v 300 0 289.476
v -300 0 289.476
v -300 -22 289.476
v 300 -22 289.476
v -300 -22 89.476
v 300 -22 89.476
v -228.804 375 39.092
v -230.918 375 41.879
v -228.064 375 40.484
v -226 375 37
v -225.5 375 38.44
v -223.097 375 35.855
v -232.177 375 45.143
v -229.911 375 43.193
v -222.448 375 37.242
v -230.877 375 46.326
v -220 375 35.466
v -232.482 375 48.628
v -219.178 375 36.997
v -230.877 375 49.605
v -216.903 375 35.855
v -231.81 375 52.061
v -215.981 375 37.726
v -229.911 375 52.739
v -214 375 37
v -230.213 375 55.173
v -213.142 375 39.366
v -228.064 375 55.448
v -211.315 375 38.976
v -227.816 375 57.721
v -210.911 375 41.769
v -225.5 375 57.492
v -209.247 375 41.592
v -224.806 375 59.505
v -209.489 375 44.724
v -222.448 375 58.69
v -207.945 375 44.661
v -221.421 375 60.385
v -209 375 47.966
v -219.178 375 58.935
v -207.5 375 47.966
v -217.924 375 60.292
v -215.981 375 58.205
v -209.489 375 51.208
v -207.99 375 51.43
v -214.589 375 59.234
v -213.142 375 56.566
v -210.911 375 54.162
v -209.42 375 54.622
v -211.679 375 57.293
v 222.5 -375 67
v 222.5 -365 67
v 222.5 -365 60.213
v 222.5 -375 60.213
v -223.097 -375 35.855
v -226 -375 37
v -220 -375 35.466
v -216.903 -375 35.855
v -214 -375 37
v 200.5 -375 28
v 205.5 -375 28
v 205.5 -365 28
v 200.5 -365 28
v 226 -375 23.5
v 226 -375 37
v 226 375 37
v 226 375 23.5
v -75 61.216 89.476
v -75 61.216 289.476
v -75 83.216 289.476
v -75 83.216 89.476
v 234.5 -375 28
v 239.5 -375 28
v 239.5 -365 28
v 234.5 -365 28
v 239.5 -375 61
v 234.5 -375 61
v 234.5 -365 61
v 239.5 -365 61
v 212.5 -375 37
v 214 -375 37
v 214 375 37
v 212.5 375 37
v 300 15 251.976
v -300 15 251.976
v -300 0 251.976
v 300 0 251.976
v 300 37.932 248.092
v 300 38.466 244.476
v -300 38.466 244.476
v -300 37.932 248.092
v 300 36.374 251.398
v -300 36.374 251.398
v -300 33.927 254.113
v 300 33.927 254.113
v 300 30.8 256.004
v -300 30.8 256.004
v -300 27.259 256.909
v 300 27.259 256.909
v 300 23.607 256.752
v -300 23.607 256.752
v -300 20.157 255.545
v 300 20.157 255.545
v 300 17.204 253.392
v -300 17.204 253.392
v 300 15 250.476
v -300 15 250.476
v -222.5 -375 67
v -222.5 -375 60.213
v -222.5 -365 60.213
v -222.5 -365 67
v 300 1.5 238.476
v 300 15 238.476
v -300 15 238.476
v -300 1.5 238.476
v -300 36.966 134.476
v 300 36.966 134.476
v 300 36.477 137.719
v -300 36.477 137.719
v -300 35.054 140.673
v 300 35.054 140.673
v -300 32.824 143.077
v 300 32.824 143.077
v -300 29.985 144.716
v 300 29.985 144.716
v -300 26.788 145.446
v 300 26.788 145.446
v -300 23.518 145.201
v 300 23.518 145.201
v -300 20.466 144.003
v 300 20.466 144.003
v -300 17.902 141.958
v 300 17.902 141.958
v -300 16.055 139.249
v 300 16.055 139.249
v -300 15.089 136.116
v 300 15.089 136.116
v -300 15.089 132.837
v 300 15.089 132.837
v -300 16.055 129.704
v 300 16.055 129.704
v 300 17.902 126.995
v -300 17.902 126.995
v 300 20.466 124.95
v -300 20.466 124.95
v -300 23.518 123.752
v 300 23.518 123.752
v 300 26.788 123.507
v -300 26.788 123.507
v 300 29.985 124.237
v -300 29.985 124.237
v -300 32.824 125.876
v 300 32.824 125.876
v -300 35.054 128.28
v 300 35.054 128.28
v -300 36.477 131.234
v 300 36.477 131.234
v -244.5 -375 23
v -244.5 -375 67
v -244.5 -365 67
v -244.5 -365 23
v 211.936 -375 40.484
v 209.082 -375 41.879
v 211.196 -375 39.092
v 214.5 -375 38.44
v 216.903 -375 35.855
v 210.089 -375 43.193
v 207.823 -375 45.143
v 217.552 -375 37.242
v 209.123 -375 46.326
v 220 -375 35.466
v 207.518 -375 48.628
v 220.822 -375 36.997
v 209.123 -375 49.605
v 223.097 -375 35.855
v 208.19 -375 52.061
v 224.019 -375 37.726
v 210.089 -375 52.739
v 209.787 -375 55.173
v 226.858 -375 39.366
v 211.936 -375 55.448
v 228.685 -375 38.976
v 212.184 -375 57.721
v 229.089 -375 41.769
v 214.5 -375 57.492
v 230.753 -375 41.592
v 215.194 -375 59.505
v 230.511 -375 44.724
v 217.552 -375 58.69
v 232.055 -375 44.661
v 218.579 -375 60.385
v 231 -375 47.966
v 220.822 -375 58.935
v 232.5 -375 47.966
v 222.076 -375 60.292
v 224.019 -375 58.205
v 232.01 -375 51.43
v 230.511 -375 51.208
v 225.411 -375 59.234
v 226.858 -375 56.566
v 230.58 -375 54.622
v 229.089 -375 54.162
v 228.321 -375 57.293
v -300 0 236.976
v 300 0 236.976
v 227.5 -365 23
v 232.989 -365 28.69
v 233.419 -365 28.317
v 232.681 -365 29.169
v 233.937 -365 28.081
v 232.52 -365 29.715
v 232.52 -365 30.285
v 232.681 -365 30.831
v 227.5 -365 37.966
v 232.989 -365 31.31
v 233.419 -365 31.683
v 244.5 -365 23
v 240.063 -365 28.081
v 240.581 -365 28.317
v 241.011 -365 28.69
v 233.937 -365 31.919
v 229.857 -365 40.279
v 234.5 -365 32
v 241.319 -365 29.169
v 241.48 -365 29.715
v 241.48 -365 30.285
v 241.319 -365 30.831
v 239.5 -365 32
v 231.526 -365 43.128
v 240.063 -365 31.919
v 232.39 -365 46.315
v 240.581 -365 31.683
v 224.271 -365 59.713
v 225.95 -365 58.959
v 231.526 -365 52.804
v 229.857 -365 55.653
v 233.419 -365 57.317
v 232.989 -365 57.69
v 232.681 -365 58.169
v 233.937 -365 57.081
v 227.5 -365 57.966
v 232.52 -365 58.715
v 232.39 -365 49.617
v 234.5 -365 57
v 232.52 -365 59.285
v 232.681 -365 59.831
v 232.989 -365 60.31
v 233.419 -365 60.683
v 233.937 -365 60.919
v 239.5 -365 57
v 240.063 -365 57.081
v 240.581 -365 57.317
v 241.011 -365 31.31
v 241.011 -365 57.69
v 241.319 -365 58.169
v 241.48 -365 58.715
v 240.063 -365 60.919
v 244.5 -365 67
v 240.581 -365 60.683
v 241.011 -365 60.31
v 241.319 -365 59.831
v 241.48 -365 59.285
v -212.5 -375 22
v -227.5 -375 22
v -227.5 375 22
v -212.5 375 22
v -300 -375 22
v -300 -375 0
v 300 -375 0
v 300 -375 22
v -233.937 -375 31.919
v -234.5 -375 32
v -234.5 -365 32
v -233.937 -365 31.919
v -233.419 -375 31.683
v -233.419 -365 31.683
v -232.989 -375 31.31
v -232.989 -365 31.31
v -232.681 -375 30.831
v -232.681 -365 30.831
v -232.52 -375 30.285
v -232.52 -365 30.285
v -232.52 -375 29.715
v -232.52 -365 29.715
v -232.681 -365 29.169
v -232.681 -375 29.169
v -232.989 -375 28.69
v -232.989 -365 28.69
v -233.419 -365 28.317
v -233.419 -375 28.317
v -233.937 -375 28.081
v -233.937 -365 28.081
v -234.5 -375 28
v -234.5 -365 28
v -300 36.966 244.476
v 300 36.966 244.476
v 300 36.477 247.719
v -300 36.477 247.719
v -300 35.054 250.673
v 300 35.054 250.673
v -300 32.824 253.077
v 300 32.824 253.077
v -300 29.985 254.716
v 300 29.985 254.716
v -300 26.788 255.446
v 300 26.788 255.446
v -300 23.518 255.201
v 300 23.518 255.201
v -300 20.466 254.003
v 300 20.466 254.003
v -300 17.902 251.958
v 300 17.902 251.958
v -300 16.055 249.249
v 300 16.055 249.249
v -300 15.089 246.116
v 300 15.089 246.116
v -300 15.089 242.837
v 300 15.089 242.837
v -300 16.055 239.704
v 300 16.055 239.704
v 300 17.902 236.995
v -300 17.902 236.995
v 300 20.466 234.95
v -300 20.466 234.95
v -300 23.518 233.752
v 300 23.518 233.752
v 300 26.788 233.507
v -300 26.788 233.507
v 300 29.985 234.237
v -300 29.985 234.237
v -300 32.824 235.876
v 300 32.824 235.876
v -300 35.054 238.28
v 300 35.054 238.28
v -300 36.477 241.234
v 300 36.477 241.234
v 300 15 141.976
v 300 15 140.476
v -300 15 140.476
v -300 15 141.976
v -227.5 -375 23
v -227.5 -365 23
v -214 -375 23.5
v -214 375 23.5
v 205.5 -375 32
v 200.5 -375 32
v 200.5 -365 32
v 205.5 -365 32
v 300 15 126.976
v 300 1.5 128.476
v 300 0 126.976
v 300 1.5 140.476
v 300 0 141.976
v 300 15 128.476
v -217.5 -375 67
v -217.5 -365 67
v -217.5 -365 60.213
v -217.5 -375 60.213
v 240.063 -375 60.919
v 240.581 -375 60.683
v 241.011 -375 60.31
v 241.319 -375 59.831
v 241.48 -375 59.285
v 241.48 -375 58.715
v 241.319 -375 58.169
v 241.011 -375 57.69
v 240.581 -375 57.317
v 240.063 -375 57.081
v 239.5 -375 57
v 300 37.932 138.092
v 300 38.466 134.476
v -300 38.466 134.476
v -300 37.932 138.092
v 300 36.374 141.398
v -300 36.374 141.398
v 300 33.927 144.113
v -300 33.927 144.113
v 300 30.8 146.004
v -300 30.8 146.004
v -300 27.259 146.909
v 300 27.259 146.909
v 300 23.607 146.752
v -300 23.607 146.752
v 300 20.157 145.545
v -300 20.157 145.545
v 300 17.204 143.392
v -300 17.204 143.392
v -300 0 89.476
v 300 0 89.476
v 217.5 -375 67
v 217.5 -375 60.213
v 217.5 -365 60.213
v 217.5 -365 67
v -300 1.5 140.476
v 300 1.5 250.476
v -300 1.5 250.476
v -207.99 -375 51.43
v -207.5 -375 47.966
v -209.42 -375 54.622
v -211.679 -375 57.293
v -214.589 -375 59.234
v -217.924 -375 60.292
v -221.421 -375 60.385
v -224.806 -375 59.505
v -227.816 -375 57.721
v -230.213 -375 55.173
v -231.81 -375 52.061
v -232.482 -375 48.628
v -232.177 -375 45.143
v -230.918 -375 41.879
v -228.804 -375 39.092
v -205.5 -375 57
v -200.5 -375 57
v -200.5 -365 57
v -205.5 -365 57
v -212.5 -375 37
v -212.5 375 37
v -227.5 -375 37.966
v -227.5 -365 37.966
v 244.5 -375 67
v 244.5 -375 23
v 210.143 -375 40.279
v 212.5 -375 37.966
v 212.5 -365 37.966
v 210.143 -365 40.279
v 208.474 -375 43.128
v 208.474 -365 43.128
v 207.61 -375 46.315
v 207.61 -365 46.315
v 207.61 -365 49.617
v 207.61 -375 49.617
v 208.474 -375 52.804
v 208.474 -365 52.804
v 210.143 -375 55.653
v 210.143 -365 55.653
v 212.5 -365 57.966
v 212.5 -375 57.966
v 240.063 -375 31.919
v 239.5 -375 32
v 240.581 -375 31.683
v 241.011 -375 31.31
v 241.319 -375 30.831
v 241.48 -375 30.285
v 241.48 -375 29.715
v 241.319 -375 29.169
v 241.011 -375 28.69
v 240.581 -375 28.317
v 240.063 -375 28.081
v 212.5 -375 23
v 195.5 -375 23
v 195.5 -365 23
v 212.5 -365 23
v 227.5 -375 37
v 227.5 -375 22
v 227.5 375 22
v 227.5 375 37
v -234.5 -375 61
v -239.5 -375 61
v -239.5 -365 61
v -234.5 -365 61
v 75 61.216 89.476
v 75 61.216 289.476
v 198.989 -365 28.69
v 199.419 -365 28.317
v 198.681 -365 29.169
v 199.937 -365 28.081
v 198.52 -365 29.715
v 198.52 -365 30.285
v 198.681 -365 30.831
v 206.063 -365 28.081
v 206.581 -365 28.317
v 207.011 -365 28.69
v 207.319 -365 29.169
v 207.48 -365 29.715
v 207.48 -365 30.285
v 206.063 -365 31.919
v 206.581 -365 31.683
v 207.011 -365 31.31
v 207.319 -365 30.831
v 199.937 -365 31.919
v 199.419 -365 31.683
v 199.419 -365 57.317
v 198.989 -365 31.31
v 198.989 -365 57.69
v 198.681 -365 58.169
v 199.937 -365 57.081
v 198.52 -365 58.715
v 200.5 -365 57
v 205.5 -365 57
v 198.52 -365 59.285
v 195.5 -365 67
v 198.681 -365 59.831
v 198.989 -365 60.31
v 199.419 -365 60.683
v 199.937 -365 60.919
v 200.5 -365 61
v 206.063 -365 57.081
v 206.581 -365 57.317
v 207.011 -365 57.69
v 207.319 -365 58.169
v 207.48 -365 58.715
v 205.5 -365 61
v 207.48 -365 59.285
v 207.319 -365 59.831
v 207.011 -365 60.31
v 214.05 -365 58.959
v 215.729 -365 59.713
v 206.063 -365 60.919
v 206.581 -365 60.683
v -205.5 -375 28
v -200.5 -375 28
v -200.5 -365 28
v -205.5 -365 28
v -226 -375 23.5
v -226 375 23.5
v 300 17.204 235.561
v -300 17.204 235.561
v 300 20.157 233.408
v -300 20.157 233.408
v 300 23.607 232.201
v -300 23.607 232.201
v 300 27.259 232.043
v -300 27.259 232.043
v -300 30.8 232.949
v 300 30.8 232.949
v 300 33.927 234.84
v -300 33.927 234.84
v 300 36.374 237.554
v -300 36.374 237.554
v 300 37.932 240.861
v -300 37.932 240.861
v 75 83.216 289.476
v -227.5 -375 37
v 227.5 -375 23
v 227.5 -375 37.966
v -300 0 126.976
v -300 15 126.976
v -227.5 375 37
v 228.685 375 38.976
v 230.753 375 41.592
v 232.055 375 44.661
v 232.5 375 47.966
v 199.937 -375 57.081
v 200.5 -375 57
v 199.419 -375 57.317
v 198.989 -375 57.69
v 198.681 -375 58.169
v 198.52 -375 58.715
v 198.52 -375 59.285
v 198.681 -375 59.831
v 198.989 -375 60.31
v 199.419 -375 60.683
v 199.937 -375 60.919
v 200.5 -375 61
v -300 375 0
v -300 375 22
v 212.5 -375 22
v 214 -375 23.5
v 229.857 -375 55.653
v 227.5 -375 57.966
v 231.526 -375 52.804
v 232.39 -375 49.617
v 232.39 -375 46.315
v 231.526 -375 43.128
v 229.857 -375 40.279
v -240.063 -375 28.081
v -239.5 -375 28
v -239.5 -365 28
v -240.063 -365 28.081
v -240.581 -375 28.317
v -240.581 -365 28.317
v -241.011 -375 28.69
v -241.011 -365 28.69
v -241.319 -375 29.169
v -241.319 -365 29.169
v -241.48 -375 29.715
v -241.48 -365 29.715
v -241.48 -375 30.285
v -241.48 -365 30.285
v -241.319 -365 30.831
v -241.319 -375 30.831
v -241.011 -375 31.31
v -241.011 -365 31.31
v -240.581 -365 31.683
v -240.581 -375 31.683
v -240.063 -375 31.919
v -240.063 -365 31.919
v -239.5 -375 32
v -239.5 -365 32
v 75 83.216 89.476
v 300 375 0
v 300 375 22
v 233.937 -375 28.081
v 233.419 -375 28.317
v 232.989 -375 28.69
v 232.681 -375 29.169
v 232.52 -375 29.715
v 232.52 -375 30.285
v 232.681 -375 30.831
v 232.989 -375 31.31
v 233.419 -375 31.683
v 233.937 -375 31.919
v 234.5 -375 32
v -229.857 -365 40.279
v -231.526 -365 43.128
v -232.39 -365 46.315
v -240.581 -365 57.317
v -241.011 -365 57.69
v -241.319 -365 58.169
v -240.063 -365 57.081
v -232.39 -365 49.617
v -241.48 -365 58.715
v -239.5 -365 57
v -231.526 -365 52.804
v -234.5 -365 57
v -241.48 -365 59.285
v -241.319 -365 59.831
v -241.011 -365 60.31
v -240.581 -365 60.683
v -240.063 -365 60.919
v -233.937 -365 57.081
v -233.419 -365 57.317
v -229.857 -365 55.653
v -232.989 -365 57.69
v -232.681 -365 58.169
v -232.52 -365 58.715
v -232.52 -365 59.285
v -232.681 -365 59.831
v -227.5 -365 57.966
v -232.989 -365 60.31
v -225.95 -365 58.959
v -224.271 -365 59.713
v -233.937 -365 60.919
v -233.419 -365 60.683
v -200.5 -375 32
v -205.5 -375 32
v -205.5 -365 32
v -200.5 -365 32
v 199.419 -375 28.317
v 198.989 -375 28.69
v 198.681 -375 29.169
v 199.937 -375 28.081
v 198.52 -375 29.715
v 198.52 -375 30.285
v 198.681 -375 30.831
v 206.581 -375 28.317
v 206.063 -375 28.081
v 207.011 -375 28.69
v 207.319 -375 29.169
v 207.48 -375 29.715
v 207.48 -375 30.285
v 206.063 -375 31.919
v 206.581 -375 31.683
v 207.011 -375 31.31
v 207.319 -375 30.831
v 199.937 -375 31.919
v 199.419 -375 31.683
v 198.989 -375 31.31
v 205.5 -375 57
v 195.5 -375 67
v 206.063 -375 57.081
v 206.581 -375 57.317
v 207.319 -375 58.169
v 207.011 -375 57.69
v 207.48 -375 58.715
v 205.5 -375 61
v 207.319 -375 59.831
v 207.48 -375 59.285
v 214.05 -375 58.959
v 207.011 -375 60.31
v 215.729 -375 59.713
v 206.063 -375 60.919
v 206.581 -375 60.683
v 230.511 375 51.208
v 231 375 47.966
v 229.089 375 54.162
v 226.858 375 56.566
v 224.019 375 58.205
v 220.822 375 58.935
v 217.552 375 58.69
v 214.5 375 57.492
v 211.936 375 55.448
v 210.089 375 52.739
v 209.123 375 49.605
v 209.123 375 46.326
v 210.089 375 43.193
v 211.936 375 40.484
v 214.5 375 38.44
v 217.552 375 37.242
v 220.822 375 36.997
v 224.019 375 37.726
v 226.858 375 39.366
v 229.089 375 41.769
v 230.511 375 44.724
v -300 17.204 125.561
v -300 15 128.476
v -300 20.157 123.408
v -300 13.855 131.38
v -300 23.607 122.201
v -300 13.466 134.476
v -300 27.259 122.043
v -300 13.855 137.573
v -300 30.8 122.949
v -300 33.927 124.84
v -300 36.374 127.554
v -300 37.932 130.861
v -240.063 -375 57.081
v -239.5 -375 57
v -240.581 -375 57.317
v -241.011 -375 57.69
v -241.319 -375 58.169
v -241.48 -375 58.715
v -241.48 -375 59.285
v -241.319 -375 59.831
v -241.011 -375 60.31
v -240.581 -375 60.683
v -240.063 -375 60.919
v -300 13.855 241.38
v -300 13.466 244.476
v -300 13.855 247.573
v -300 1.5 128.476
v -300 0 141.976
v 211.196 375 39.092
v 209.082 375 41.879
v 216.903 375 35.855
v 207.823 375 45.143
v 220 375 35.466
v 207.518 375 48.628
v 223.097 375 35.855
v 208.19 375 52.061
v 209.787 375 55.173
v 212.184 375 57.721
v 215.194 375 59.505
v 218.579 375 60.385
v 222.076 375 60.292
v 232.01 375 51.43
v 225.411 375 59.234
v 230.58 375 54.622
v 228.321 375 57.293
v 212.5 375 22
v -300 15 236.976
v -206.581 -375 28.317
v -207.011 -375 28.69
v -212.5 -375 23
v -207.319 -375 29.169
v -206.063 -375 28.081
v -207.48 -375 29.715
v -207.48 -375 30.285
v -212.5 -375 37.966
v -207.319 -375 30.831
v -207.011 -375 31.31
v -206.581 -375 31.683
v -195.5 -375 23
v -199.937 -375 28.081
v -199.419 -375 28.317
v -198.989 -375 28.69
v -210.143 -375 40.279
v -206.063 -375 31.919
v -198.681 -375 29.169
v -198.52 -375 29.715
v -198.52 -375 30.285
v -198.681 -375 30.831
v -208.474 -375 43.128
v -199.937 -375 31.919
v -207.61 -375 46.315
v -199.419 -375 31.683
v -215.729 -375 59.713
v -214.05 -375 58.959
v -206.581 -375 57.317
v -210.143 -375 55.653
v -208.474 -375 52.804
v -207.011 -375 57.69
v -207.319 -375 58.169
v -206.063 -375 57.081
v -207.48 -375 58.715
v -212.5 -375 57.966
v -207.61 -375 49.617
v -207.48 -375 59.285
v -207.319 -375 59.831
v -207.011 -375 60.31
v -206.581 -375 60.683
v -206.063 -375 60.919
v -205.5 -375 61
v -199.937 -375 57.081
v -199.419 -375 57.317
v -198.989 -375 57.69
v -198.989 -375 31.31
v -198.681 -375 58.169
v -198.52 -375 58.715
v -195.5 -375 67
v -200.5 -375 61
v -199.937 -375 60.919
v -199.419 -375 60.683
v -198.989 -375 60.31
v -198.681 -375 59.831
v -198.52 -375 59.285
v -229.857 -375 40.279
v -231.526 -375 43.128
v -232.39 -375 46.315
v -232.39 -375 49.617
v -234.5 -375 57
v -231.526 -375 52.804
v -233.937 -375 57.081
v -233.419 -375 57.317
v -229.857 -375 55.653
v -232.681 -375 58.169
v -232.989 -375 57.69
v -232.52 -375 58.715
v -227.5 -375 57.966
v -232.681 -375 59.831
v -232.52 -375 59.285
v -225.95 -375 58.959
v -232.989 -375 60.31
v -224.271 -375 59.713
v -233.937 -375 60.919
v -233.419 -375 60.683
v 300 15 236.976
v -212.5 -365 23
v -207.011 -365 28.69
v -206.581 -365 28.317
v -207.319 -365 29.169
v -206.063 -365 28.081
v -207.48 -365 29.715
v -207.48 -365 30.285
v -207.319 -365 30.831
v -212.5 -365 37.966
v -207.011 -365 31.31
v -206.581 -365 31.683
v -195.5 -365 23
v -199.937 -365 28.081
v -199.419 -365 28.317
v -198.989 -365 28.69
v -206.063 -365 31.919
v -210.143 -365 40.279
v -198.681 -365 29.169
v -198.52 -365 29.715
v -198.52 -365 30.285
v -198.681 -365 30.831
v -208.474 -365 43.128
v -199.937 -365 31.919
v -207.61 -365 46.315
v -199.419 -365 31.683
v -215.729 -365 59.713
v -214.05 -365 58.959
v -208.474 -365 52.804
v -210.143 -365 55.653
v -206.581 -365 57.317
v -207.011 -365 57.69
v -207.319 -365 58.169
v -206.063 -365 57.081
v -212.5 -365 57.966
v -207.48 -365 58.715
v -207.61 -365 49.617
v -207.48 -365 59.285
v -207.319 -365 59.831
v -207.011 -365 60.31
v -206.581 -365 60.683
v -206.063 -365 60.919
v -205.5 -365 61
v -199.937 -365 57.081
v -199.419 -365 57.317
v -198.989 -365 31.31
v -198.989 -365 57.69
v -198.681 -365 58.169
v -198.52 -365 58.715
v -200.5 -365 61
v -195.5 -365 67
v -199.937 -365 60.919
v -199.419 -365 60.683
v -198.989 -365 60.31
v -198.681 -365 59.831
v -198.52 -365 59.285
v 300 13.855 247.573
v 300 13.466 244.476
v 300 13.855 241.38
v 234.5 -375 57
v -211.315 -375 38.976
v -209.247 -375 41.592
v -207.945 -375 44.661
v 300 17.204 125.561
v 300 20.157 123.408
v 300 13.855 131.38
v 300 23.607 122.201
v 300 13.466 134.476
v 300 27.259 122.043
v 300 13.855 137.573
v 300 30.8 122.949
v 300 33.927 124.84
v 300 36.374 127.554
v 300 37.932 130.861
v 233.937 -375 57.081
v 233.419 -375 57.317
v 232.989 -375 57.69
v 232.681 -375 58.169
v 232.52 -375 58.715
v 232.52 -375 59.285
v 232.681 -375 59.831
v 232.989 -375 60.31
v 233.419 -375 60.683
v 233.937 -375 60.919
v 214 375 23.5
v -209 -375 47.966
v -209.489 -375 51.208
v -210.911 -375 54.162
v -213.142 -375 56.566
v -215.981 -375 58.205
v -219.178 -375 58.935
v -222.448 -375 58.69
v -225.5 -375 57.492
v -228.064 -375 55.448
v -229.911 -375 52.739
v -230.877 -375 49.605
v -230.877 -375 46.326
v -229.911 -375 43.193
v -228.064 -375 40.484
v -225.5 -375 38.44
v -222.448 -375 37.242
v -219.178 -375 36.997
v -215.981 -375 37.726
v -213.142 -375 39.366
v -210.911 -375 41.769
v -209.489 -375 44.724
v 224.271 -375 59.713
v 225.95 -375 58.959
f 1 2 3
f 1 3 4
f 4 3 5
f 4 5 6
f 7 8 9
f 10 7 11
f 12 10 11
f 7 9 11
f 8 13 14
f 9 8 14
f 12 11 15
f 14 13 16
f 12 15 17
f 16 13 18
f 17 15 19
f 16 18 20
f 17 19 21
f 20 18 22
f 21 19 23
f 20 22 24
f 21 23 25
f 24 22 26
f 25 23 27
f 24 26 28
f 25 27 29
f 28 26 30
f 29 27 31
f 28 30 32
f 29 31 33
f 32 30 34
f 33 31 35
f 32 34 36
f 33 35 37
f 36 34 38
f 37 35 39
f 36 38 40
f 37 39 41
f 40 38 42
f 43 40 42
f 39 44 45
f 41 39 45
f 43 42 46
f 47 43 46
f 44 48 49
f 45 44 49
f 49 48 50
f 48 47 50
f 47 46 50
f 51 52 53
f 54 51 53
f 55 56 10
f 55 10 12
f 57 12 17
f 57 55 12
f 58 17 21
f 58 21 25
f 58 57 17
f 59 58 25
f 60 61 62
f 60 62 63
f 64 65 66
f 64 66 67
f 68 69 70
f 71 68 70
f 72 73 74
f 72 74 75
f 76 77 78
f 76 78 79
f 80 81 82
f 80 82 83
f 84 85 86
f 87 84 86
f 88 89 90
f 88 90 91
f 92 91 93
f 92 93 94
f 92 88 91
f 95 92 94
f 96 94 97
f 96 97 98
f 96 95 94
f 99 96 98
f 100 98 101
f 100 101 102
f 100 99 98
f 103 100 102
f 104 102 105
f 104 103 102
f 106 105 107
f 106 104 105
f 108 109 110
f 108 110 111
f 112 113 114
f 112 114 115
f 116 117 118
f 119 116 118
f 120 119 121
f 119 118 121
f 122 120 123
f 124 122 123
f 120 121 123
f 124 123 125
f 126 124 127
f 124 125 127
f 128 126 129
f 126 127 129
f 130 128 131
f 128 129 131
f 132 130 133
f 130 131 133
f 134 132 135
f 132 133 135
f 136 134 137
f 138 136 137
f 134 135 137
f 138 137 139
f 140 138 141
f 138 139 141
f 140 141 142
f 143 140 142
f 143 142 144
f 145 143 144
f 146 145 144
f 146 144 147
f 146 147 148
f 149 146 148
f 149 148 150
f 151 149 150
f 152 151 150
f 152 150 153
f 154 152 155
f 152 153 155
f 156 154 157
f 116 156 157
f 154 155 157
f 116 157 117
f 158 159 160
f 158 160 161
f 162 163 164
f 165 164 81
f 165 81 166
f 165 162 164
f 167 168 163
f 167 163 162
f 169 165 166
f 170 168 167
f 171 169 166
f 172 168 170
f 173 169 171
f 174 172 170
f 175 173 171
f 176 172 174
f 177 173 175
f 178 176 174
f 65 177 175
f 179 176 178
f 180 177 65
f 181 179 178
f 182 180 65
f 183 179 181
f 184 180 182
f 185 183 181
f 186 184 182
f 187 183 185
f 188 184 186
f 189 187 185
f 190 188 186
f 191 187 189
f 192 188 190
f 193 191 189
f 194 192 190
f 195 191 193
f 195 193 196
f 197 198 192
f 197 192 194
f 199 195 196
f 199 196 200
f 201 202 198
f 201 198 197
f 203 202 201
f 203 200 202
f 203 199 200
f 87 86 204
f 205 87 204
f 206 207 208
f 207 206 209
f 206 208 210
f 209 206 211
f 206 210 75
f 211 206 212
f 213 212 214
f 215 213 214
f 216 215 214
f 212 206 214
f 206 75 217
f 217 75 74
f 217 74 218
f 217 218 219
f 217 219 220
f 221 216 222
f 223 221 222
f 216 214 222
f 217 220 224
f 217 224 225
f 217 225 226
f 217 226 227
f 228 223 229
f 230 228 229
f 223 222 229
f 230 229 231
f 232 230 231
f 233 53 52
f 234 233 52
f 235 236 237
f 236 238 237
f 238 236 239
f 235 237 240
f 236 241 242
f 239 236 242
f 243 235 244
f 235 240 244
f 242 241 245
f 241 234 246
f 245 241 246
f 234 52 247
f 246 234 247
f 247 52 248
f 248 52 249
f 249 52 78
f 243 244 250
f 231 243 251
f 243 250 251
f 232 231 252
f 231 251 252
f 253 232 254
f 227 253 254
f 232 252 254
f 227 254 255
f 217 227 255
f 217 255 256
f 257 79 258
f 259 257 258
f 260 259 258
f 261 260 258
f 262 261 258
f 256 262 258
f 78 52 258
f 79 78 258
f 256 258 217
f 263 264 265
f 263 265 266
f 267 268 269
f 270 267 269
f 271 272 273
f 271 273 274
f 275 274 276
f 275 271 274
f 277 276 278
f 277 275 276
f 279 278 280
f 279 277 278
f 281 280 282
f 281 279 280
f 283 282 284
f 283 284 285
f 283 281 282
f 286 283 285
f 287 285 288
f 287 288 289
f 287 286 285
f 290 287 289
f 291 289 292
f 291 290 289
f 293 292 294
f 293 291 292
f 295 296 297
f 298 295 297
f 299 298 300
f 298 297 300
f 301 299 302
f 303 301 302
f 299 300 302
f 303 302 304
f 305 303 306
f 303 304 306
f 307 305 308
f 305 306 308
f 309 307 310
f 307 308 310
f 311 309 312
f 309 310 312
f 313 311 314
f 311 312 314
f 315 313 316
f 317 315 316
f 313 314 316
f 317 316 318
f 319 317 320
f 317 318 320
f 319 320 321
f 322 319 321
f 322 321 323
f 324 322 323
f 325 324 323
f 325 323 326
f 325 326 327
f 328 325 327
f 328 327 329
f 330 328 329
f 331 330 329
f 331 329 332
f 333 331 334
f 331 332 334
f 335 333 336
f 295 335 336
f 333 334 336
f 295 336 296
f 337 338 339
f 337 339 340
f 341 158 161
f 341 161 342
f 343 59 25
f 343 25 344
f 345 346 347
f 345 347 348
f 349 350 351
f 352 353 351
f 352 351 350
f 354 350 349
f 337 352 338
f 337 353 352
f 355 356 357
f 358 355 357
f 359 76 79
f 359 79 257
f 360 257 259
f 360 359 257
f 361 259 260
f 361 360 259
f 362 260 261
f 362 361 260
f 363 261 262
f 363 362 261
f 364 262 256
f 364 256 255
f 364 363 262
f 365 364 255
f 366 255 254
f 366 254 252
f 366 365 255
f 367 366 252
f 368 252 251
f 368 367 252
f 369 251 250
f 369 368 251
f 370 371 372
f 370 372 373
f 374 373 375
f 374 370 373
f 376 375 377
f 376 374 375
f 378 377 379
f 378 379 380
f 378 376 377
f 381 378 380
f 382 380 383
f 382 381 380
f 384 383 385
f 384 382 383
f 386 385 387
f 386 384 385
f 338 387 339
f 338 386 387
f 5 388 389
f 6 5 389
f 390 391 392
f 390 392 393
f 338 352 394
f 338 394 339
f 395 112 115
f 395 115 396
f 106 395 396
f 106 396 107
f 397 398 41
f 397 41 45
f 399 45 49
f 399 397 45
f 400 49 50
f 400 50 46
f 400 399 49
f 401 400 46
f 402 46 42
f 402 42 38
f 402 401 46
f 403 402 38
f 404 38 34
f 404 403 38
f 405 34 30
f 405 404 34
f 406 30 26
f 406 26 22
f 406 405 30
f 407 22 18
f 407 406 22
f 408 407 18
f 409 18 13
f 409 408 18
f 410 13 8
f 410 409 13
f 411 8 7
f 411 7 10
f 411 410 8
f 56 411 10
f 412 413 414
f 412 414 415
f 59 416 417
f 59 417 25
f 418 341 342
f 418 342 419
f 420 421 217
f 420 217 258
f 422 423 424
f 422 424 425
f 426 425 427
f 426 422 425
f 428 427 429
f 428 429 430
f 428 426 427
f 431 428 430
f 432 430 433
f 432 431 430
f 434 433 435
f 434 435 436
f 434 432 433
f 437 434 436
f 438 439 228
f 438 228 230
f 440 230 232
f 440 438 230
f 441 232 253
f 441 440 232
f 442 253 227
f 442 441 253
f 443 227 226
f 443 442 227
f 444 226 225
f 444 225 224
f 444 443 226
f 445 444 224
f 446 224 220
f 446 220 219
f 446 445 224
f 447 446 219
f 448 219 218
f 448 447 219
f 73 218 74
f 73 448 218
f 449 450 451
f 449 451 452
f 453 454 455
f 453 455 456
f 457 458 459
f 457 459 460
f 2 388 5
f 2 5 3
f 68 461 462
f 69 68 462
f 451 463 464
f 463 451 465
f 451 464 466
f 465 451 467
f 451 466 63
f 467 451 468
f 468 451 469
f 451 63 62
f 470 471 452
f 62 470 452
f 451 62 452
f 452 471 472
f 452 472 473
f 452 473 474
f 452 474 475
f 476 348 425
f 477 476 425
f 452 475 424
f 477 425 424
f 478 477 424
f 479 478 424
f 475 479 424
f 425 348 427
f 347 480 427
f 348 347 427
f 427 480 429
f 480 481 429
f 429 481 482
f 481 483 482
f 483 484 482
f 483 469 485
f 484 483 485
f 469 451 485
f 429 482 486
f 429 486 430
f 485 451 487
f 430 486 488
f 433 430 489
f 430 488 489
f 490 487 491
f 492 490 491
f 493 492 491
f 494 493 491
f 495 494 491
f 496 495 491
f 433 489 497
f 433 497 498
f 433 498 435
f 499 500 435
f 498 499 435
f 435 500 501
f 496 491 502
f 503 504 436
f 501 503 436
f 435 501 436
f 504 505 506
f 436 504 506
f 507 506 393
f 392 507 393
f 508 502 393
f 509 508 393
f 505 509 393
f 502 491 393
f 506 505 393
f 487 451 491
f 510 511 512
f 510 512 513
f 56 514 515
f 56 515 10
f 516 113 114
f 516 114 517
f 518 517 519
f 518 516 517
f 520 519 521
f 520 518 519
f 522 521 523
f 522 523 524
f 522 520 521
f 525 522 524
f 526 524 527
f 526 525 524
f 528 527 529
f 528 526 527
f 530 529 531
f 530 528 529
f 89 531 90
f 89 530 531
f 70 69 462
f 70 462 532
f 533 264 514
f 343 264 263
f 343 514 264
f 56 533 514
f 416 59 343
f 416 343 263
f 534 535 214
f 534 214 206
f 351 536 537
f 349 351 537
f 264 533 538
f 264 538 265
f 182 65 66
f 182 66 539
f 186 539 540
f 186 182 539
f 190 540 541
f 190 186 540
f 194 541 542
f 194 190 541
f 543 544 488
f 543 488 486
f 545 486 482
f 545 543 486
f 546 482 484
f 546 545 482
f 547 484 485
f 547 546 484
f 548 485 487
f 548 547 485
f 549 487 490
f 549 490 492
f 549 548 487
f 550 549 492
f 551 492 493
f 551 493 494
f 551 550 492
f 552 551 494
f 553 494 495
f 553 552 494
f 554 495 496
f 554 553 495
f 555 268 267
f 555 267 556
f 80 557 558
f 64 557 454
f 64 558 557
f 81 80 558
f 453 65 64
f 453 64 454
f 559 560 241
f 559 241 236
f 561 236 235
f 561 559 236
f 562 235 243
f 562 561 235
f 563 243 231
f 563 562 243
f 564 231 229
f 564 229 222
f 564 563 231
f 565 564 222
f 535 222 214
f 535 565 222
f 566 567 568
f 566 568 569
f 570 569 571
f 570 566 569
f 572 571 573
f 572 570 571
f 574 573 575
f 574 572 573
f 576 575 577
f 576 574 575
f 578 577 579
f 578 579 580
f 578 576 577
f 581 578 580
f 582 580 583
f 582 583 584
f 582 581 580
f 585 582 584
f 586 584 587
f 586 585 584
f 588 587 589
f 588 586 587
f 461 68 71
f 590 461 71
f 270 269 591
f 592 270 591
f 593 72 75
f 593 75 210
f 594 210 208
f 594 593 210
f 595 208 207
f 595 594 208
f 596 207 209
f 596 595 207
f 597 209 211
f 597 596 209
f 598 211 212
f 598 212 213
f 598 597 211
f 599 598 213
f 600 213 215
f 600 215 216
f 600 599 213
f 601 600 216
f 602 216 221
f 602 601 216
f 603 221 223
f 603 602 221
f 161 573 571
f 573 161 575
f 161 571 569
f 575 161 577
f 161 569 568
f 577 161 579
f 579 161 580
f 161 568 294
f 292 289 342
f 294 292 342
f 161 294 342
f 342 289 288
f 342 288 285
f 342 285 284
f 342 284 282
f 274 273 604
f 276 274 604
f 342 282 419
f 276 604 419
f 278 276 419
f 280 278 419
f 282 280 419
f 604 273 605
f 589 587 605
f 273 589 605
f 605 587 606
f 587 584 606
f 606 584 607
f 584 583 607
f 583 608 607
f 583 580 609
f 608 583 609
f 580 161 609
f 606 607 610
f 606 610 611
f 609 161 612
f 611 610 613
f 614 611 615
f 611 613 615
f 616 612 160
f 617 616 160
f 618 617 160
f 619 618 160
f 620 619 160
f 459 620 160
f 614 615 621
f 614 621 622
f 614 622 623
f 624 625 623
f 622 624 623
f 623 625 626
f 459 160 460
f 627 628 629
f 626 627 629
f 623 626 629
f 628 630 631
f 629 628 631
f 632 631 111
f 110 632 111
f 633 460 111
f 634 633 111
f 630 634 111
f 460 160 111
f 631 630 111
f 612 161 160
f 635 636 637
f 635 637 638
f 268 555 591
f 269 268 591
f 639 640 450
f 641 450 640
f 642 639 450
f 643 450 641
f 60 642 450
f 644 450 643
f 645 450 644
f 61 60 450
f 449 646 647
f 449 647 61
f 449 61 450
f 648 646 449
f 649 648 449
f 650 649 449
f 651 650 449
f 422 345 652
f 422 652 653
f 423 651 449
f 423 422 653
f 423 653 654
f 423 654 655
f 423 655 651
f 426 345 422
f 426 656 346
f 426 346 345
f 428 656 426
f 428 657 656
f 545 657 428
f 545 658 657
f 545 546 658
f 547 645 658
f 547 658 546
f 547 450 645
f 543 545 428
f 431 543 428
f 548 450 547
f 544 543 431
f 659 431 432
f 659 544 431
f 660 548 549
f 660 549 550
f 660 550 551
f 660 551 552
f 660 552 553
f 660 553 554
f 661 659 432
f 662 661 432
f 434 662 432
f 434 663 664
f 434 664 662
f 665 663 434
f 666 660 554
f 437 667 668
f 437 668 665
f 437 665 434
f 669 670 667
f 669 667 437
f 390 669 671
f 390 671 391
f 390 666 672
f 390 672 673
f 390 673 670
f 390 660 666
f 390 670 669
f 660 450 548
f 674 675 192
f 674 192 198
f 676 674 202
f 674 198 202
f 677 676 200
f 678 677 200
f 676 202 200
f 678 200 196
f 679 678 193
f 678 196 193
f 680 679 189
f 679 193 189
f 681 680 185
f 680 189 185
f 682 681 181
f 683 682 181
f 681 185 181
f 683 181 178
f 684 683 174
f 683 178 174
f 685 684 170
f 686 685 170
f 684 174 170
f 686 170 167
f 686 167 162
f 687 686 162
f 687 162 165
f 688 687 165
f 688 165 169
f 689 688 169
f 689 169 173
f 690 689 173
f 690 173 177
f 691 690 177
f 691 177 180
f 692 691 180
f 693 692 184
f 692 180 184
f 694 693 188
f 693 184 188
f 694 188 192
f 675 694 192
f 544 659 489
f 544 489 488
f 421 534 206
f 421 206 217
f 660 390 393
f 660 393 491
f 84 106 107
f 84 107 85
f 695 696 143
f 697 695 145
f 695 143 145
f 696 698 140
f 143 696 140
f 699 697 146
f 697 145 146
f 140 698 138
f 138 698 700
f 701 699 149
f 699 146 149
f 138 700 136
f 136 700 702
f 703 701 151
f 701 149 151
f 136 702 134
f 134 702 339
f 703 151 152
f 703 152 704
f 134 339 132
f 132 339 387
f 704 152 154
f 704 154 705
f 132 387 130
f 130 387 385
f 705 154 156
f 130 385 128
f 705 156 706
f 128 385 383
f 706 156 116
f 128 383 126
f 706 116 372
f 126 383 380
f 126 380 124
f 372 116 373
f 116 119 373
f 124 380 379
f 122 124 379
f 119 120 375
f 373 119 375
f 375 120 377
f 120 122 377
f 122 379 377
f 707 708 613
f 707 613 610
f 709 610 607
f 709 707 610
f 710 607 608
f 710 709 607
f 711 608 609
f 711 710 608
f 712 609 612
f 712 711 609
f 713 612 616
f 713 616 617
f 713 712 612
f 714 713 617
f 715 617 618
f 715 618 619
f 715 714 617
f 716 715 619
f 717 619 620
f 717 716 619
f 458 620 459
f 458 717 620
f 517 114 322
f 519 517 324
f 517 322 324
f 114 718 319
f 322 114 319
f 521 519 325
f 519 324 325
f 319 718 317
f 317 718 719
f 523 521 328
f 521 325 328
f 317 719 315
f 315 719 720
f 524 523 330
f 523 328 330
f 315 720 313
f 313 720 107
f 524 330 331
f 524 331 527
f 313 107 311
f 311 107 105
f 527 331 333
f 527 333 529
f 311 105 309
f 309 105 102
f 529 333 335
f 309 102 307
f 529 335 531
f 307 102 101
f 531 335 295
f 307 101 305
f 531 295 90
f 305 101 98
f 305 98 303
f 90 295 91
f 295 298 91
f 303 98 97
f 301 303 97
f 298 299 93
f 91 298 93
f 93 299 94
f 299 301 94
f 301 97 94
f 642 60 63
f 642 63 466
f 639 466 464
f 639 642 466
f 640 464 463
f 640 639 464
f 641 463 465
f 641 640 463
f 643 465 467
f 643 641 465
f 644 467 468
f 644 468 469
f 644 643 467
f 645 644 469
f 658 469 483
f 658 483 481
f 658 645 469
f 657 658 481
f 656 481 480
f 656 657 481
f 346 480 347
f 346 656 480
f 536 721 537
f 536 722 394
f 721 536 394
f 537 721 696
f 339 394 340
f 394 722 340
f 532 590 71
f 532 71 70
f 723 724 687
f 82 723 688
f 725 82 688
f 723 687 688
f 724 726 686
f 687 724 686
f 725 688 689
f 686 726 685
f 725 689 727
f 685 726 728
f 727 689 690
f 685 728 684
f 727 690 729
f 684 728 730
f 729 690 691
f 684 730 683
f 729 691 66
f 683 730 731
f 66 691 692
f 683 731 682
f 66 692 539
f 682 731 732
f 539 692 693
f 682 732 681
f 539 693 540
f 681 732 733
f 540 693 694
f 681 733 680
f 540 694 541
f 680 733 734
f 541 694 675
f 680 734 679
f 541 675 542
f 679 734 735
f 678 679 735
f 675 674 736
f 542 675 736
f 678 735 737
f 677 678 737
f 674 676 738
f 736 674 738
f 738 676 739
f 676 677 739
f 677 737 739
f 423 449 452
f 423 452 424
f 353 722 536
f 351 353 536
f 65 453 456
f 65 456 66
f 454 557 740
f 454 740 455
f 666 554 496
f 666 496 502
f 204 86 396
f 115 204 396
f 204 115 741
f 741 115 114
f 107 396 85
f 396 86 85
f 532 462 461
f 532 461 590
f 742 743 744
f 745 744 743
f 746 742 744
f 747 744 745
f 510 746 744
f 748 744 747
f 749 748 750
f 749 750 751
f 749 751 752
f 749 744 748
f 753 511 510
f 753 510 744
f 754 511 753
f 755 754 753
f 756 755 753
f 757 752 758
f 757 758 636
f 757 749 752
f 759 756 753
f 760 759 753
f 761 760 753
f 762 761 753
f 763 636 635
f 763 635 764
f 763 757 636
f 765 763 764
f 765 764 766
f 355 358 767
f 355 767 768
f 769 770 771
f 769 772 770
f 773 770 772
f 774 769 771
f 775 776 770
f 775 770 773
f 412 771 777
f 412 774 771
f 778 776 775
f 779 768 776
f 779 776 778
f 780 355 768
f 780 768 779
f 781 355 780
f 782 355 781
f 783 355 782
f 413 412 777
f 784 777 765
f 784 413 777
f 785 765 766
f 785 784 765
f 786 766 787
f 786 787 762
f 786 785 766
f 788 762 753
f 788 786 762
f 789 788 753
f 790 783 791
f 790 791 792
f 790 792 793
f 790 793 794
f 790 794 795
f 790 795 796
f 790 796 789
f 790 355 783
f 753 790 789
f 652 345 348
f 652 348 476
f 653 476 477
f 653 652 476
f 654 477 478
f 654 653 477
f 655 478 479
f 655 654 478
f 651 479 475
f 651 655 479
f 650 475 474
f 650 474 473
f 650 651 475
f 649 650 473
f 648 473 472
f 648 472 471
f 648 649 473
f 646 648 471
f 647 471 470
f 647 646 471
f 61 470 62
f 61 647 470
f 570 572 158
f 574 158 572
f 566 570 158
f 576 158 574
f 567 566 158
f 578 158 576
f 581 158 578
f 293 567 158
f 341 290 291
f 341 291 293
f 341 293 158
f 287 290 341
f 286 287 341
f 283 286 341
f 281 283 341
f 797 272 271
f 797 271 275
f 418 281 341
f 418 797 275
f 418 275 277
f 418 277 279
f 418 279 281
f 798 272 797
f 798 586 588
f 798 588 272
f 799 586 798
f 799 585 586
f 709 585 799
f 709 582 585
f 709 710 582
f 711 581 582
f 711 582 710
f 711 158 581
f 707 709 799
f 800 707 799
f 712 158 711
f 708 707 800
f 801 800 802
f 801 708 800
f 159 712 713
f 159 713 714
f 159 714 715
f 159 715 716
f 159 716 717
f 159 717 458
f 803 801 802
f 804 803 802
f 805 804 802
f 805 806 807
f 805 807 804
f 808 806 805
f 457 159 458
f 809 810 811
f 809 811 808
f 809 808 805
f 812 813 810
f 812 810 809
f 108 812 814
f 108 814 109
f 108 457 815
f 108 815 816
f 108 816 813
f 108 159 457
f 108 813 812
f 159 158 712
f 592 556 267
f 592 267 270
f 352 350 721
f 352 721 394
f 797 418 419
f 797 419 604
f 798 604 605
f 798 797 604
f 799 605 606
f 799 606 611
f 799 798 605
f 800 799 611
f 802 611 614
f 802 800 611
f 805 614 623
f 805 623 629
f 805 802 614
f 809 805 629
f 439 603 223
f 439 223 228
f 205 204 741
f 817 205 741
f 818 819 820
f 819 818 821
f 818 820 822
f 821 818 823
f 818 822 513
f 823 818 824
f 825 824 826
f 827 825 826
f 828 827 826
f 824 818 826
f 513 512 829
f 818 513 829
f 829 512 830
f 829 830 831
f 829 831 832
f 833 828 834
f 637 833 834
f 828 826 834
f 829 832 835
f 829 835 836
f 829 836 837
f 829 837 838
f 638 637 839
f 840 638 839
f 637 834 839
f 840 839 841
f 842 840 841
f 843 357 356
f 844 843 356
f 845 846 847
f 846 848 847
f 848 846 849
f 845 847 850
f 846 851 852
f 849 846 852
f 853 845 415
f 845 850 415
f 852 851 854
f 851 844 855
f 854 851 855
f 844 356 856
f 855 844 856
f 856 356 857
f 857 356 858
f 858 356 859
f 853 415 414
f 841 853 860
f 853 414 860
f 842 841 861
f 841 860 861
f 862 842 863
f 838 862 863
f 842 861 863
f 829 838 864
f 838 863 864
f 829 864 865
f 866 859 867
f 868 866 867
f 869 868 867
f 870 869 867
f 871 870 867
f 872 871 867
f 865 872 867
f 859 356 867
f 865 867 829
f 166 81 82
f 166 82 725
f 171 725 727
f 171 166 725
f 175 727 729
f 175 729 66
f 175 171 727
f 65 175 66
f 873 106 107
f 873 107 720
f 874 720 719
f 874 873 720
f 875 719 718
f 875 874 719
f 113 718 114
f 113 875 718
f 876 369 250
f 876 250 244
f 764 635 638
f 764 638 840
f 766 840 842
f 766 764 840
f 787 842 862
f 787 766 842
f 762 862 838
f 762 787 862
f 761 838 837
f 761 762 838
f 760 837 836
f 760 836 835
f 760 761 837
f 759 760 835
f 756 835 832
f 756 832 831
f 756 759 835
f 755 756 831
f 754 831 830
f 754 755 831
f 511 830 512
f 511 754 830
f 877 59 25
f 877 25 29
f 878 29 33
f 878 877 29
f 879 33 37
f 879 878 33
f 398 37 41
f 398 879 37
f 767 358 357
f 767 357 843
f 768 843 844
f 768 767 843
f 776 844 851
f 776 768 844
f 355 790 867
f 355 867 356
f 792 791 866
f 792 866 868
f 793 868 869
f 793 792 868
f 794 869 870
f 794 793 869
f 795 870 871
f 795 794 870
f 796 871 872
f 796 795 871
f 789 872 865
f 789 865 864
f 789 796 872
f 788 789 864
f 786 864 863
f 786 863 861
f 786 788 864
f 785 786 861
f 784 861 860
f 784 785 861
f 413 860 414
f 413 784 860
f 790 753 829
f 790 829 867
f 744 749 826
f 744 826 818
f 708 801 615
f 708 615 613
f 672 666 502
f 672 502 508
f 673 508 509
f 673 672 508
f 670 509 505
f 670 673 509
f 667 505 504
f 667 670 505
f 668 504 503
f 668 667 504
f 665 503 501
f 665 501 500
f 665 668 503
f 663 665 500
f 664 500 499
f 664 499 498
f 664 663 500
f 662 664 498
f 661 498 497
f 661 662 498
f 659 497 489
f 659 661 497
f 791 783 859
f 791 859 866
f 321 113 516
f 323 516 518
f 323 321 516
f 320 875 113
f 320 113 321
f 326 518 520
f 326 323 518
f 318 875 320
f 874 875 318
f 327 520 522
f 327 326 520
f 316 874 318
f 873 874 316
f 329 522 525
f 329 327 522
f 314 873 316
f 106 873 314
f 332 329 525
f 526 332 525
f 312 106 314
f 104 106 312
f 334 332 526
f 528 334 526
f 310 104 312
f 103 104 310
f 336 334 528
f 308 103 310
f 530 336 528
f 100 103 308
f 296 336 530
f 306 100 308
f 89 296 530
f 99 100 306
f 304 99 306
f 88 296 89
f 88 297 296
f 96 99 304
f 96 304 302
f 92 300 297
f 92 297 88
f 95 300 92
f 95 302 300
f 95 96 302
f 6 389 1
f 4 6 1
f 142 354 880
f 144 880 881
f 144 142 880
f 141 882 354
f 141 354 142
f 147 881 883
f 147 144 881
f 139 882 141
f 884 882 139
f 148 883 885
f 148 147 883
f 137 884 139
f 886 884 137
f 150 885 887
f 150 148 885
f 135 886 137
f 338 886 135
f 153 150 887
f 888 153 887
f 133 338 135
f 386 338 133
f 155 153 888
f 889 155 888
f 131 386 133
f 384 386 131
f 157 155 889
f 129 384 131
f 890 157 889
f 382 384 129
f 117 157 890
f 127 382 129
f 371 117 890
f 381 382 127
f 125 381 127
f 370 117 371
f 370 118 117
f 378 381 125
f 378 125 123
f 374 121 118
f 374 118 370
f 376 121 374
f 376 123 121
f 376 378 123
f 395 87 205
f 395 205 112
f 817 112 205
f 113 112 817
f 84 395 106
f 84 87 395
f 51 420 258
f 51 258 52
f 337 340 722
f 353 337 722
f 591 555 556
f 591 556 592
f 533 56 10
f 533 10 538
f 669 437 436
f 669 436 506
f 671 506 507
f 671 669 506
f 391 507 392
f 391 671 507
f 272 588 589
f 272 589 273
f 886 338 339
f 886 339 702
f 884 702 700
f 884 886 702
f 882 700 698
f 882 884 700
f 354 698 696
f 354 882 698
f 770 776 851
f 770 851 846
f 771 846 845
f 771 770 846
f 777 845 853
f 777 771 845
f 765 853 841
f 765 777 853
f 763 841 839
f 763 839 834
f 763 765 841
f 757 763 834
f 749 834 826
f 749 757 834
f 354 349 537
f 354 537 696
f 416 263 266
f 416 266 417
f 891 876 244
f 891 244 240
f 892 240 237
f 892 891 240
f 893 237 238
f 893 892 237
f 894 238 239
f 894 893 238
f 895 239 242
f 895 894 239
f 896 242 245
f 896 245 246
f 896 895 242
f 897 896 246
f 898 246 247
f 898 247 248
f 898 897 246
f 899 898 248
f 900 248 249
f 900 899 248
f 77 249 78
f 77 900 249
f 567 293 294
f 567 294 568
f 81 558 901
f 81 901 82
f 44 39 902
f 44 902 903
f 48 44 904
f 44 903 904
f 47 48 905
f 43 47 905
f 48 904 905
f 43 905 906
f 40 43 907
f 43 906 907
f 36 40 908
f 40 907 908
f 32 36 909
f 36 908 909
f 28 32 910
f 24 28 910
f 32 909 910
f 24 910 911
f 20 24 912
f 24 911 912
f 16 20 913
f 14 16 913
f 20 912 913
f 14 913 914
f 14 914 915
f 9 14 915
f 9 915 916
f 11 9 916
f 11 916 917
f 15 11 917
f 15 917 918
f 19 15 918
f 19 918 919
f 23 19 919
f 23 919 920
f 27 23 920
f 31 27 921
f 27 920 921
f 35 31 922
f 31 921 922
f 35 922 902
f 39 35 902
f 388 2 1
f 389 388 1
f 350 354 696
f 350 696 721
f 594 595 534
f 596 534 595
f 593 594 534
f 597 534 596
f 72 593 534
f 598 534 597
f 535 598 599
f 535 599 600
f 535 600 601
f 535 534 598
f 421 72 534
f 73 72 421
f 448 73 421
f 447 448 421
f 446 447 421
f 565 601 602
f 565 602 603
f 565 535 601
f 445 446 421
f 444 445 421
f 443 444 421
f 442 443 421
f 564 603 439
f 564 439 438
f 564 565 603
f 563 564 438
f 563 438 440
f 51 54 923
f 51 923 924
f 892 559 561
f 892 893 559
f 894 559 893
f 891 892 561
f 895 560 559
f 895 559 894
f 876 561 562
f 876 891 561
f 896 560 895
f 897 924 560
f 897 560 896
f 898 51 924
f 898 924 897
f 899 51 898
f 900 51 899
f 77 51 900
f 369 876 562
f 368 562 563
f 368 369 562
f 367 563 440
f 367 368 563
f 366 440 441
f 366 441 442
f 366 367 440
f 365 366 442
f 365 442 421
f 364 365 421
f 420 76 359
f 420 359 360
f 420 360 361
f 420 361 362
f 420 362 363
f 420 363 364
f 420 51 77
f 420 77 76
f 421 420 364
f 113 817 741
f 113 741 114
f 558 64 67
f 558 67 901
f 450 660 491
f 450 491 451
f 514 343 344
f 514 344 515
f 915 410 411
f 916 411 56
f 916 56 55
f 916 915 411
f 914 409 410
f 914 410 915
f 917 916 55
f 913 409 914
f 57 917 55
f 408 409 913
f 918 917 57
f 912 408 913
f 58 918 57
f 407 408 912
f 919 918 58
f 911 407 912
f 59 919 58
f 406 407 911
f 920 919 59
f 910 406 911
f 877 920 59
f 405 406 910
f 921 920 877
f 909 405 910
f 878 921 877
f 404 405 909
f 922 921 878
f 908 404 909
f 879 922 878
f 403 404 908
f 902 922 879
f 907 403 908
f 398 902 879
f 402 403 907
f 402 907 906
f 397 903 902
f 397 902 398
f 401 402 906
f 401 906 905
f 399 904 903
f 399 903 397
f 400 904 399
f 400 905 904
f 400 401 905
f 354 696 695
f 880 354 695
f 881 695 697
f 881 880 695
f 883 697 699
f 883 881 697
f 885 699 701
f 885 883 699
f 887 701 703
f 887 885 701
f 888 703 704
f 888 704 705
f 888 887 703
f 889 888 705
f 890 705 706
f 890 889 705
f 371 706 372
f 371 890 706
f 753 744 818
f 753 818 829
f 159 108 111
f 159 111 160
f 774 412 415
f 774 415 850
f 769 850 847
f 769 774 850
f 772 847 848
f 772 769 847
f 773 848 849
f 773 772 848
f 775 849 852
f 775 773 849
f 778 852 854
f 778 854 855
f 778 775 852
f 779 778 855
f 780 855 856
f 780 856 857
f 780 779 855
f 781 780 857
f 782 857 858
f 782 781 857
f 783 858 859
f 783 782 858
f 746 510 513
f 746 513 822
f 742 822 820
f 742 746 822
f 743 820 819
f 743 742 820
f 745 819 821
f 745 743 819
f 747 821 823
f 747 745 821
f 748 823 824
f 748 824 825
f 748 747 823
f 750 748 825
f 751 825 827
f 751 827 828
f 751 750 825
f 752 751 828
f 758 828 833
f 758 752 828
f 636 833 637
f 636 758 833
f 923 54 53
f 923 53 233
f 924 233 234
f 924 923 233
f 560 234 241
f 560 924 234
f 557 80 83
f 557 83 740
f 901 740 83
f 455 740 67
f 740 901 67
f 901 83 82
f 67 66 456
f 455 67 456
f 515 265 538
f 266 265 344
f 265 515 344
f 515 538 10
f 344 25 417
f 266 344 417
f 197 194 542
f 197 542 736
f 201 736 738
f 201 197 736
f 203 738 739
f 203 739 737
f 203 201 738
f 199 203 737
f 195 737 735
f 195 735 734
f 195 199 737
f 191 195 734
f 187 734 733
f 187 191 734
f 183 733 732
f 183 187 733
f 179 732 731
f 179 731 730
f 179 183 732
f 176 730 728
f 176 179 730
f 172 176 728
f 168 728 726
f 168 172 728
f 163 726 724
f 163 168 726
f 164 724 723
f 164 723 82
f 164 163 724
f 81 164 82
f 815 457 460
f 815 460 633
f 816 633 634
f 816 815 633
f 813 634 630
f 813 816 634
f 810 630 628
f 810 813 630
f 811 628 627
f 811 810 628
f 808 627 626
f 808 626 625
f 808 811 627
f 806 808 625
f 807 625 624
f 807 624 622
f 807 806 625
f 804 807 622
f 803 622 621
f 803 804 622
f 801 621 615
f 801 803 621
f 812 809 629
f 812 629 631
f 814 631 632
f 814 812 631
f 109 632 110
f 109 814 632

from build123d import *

# Parameters (mm, degrees)
F0_W      = 600
F0_H      = 750
F1_DEPTH  = 22
F3_DEPTH  = 750
F2_R      = 11
F5_DEPTH  = 10
F6_W      = 600
F6_H      = 200
F7_DEPTH  = 22
F8_R      = 11
F9_DEPTH  = 600
F10_W     = 22
F10_H     = 200
F11_DEPTH = 75


with BuildPart() as f1:
    # F0 (on Top) → F1 (new body)
    with BuildSketch(Plane.XY):
        Rectangle(F0_W, F0_H)
    extrude(amount=F1_DEPTH)


with BuildPart() as f3:
    # F2 (on face) → F3 (new body, through all)
    with BuildSketch(Plane.XZ.offset(375)):
        Polygon((-226, 37), (-227.5, 37), (-227.5, 22), (-212.5, 22), (-212.5, 37), (-214, 37), (-214, 23.5), (-226, 23.5), align=None)
    extrude(amount=-F3_DEPTH)


with BuildPart() as f3b:
    # F2 (on face) → F3, piece 2 (new body, through all)
    with BuildSketch(Plane.XZ.offset(375)):
        with BuildLine():
            ThreePointArc((-207.5, 47.9658560997), (-226.373774392, 58.7187626835), (-226, 37))
            ThreePointArc((-226, 37), (-220, 35.4658560997), (-214, 37))
            ThreePointArc((-214, 37), (-209.2470934162, 41.5920817077), (-207.5, 47.9658560997))
        make_face()
        with Locations((-220, 47.9658560997)):
            Circle(F2_R, mode=Mode.SUBTRACT)
    extrude(amount=-F3_DEPTH)


with BuildPart() as f3c:
    # F2 (on face) → F3, piece 3 (new body, through all)
    with BuildSketch(Plane.XZ.offset(375)):
        Polygon((212.5, 37), (212.5, 22), (227.5, 22), (227.5, 37), (226, 37), (226, 23.5), (214, 23.5), (214, 37), align=None)
    extrude(amount=-F3_DEPTH)


with BuildPart() as f3d:
    # F2 (on face) → F3, piece 4 (new body, through all)
    with BuildSketch(Plane.XZ.offset(375)):
        with BuildLine():
            ThreePointArc((232.5, 47.9658560997), (213.626225608, 58.7187626835), (214, 37))
            ThreePointArc((214, 37), (220, 35.4658560997), (226, 37))
            ThreePointArc((226, 37), (230.7529065838, 41.5920817077), (232.5, 47.9658560997))
        make_face()
        with Locations((220, 47.9658560997)):
            Circle(F2_R, mode=Mode.SUBTRACT)
    extrude(amount=-F3_DEPTH)


with BuildPart() as f5:
    # F4 (on face) → F5 (new body)
    with BuildSketch(Plane.XZ.offset(375)):
        with BuildLine():
            ThreePointArc((-227.5, 57.9658560997), (-225.1247201319, 59.3670509305), (-222.5, 60.2133048136))
            Line((-222.5, 60.2133048136), (-222.5, 67))
            Line((-222.5, 67), (-244.5, 67))
            Line((-244.5, 67), (-244.5, 23))
            Line((-244.5, 23), (-227.5, 23))
            Line((-227.5, 23), (-227.5, 37))
            Line((-227.5, 37), (-227.5, 37.9658560997))
            ThreePointArc((-227.5, 37.9658560997), (-232.5, 47.9658560997), (-227.5, 57.9658560997))
        make_face()
        with BuildLine():
            Line((-234.5, 28), (-239.5, 28))
            ThreePointArc((-239.5, 28), (-241.5, 30), (-239.5, 32))
            Line((-239.5, 32), (-234.5, 32))
            ThreePointArc((-234.5, 32), (-232.5, 30), (-234.5, 28))
        make_face(mode=Mode.SUBTRACT)
        with BuildLine():
            ThreePointArc((-239.5, 57), (-241.5, 59), (-239.5, 61))
            Line((-239.5, 61), (-234.5, 61))
            ThreePointArc((-234.5, 61), (-232.5, 59), (-234.5, 57))
            Line((-234.5, 57), (-239.5, 57))
        make_face(mode=Mode.SUBTRACT)
    extrude(amount=-F5_DEPTH)


with BuildPart() as f5b:
    # F4 (on face) → F5, piece 2 (new body)
    with BuildSketch(Plane.XZ.offset(375)):
        with BuildLine():
            Line((-217.5, 67), (-217.5, 60.2133048136))
            ThreePointArc((-217.5, 60.2133048136), (-214.8752798681, 59.3670509305), (-212.5, 57.9658560997))
            ThreePointArc((-212.5, 57.9658560997), (-208.8196601125, 53.5560260435), (-207.5, 47.9658560997))
            ThreePointArc((-207.5, 47.9658560997), (-208.8196601125, 42.375686156), (-212.5, 37.9658560997))
            Line((-212.5, 37.9658560997), (-212.5, 37))
            Line((-212.5, 37), (-212.5, 23))
            Line((-212.5, 23), (-195.5, 23))
            Line((-195.5, 23), (-195.5, 67))
            Line((-195.5, 67), (-217.5, 67))
        make_face()
        with BuildLine():
            Line((-205.5, 32), (-200.5, 32))
            ThreePointArc((-200.5, 32), (-198.5, 30), (-200.5, 28))
            Line((-200.5, 28), (-205.5, 28))
            ThreePointArc((-205.5, 28), (-207.5, 30), (-205.5, 32))
        make_face(mode=Mode.SUBTRACT)
        with BuildLine():
            ThreePointArc((-200.5, 61), (-198.5, 59), (-200.5, 57))
            Line((-200.5, 57), (-205.5, 57))
            ThreePointArc((-205.5, 57), (-207.5, 59), (-205.5, 61))
            Line((-205.5, 61), (-200.5, 61))
        make_face(mode=Mode.SUBTRACT)
    extrude(amount=-F5_DEPTH)


with BuildPart() as f5c:
    # F4 (on face) → F5, piece 3 (new body)
    with BuildSketch(Plane.XZ.offset(375)):
        with BuildLine():
            Line((195.5, 67), (195.5, 23))
            Line((195.5, 23), (212.5, 23))
            Line((212.5, 23), (212.5, 37))
            Line((212.5, 37), (212.5, 37.9658560997))
            ThreePointArc((212.5, 37.9658560997), (207.5, 47.9658560997), (212.5, 57.9658560997))
            ThreePointArc((212.5, 57.9658560997), (214.8752798681, 59.3670509305), (217.5, 60.2133048136))
            Line((217.5, 60.2133048136), (217.5, 67))
            Line((217.5, 67), (195.5, 67))
        make_face()
        with BuildLine():
            Line((205.5, 28), (200.5, 28))
            ThreePointArc((200.5, 28), (198.5, 30), (200.5, 32))
            Line((200.5, 32), (205.5, 32))
            ThreePointArc((205.5, 32), (207.5, 30), (205.5, 28))
        make_face(mode=Mode.SUBTRACT)
        with BuildLine():
            ThreePointArc((200.5, 57), (198.5, 59), (200.5, 61))
            Line((200.5, 61), (205.5, 61))
            ThreePointArc((205.5, 61), (207.5, 59), (205.5, 57))
            Line((205.5, 57), (200.5, 57))
        make_face(mode=Mode.SUBTRACT)
    extrude(amount=-F5_DEPTH)


with BuildPart() as f5d:
    # F4 (on face) → F5, piece 4 (new body)
    with BuildSketch(Plane.XZ.offset(375)):
        with BuildLine():
            Line((227.5, 37), (227.5, 23))
            Line((227.5, 23), (244.5, 23))
            Line((244.5, 23), (244.5, 67))
            Line((244.5, 67), (222.5, 67))
            Line((222.5, 67), (222.5, 60.2133048136))
            ThreePointArc((222.5, 60.2133048136), (225.1247201319, 59.3670509305), (227.5, 57.9658560997))
            ThreePointArc((227.5, 57.9658560997), (231.1803398875, 53.5560260435), (232.5, 47.9658560997))
            ThreePointArc((232.5, 47.9658560997), (231.1803398875, 42.375686156), (227.5, 37.9658560997))
            Line((227.5, 37.9658560997), (227.5, 37))
        make_face()
        with BuildLine():
            ThreePointArc((239.5, 32), (241.5, 30), (239.5, 28))
            Line((239.5, 28), (234.5, 28))
            ThreePointArc((234.5, 28), (232.5, 30), (234.5, 32))
            Line((234.5, 32), (239.5, 32))
        make_face(mode=Mode.SUBTRACT)
        with BuildLine():
            Line((239.5, 57), (234.5, 57))
            ThreePointArc((234.5, 57), (232.5, 59), (234.5, 61))
            Line((234.5, 61), (239.5, 61))
            ThreePointArc((239.5, 61), (241.5, 59), (239.5, 57))
        make_face(mode=Mode.SUBTRACT)
    extrude(amount=-F5_DEPTH)


with BuildPart() as f7:
    # F6 (on Front) → F7 (new body)
    with BuildSketch(Plane.XZ):
        with Locations((0, 189.4764214754)):
            Rectangle(F6_W, F6_H)
    extrude(amount=F7_DEPTH)


with BuildPart() as f9:
    # F8 (on face) → F9 (new body, through all)
    with BuildSketch(Plane.YZ.offset(300)):
        with BuildLine():
            ThreePointArc((38.4658560997, 244.4764214754), (29.0623701683, 256.5868137326), (15, 250.4764214754))
            ThreePointArc((15, 250.4764214754), (13.4658560997, 244.4764214754), (15, 238.4764214754))
            ThreePointArc((15, 238.4764214754), (29.0623701683, 232.3660292182), (38.4658560997, 244.4764214754))
        make_face()
        with Locations((25.9658560997, 244.4764214754)):
            Circle(F8_R, mode=Mode.SUBTRACT)
    extrude(amount=-F9_DEPTH)


with BuildPart() as f9b:
    # F8 (on face) → F9, piece 2 (new body, through all)
    with BuildSketch(Plane.YZ.offset(300)):
        Polygon((0, 251.9764214754), (0, 244.4764214754), (0, 236.9764214754), (15, 236.9764214754), (15, 238.4764214754), (1.5, 238.4764214754), (1.5, 244.4764214754), (1.5, 250.4764214754), (15, 250.4764214754), (15, 251.9764214754), align=None)
    extrude(amount=-F9_DEPTH)


with BuildPart() as f9c:
    # F8 (on face) → F9, piece 3 (new body, through all)
    with BuildSketch(Plane.YZ.offset(300)):
        Polygon((15, 141.9764214754), (0, 141.9764214754), (0, 134.4764214754), (0, 126.9764214754), (15, 126.9764214754), (15, 128.4764214754), (1.5, 128.4764214754), (1.5, 134.4764214754), (1.5, 140.4764214754), (15, 140.4764214754), align=None)
    extrude(amount=-F9_DEPTH)


with BuildPart() as f9d:
    # F8 (on face) → F9, piece 4 (new body, through all)
    with BuildSketch(Plane.YZ.offset(300)):
        with BuildLine():
            ThreePointArc((38.4658560997, 134.4764214754), (29.0623701683, 146.5868137326), (15, 140.4764214754))
            ThreePointArc((15, 140.4764214754), (13.4658560997, 134.4764214754), (15, 128.4764214754))
            ThreePointArc((15, 128.4764214754), (29.0623701683, 122.3660292182), (38.4658560997, 134.4764214754))
        make_face()
        with Locations((25.9658560997, 134.4764214754)):
            Circle(F8_R, mode=Mode.SUBTRACT)
    extrude(amount=-F9_DEPTH)


with BuildPart() as f11:
    # F10 (on Right) → F11 (new body, symmetric)
    with BuildSketch(Plane.YZ):
        with Locations((72.2158560997, 189.4764214754)):
            Rectangle(F10_W, F10_H)
    extrude(amount=F11_DEPTH, both=True)


solid = Compound([f1.part, f3.part, f3b.part, f3c.part, f3d.part, f5.part, f5b.part, f5c.part, f5d.part, f7.part, f9.part, f9b.part, f9c.part, f9d.part, f11.part])
